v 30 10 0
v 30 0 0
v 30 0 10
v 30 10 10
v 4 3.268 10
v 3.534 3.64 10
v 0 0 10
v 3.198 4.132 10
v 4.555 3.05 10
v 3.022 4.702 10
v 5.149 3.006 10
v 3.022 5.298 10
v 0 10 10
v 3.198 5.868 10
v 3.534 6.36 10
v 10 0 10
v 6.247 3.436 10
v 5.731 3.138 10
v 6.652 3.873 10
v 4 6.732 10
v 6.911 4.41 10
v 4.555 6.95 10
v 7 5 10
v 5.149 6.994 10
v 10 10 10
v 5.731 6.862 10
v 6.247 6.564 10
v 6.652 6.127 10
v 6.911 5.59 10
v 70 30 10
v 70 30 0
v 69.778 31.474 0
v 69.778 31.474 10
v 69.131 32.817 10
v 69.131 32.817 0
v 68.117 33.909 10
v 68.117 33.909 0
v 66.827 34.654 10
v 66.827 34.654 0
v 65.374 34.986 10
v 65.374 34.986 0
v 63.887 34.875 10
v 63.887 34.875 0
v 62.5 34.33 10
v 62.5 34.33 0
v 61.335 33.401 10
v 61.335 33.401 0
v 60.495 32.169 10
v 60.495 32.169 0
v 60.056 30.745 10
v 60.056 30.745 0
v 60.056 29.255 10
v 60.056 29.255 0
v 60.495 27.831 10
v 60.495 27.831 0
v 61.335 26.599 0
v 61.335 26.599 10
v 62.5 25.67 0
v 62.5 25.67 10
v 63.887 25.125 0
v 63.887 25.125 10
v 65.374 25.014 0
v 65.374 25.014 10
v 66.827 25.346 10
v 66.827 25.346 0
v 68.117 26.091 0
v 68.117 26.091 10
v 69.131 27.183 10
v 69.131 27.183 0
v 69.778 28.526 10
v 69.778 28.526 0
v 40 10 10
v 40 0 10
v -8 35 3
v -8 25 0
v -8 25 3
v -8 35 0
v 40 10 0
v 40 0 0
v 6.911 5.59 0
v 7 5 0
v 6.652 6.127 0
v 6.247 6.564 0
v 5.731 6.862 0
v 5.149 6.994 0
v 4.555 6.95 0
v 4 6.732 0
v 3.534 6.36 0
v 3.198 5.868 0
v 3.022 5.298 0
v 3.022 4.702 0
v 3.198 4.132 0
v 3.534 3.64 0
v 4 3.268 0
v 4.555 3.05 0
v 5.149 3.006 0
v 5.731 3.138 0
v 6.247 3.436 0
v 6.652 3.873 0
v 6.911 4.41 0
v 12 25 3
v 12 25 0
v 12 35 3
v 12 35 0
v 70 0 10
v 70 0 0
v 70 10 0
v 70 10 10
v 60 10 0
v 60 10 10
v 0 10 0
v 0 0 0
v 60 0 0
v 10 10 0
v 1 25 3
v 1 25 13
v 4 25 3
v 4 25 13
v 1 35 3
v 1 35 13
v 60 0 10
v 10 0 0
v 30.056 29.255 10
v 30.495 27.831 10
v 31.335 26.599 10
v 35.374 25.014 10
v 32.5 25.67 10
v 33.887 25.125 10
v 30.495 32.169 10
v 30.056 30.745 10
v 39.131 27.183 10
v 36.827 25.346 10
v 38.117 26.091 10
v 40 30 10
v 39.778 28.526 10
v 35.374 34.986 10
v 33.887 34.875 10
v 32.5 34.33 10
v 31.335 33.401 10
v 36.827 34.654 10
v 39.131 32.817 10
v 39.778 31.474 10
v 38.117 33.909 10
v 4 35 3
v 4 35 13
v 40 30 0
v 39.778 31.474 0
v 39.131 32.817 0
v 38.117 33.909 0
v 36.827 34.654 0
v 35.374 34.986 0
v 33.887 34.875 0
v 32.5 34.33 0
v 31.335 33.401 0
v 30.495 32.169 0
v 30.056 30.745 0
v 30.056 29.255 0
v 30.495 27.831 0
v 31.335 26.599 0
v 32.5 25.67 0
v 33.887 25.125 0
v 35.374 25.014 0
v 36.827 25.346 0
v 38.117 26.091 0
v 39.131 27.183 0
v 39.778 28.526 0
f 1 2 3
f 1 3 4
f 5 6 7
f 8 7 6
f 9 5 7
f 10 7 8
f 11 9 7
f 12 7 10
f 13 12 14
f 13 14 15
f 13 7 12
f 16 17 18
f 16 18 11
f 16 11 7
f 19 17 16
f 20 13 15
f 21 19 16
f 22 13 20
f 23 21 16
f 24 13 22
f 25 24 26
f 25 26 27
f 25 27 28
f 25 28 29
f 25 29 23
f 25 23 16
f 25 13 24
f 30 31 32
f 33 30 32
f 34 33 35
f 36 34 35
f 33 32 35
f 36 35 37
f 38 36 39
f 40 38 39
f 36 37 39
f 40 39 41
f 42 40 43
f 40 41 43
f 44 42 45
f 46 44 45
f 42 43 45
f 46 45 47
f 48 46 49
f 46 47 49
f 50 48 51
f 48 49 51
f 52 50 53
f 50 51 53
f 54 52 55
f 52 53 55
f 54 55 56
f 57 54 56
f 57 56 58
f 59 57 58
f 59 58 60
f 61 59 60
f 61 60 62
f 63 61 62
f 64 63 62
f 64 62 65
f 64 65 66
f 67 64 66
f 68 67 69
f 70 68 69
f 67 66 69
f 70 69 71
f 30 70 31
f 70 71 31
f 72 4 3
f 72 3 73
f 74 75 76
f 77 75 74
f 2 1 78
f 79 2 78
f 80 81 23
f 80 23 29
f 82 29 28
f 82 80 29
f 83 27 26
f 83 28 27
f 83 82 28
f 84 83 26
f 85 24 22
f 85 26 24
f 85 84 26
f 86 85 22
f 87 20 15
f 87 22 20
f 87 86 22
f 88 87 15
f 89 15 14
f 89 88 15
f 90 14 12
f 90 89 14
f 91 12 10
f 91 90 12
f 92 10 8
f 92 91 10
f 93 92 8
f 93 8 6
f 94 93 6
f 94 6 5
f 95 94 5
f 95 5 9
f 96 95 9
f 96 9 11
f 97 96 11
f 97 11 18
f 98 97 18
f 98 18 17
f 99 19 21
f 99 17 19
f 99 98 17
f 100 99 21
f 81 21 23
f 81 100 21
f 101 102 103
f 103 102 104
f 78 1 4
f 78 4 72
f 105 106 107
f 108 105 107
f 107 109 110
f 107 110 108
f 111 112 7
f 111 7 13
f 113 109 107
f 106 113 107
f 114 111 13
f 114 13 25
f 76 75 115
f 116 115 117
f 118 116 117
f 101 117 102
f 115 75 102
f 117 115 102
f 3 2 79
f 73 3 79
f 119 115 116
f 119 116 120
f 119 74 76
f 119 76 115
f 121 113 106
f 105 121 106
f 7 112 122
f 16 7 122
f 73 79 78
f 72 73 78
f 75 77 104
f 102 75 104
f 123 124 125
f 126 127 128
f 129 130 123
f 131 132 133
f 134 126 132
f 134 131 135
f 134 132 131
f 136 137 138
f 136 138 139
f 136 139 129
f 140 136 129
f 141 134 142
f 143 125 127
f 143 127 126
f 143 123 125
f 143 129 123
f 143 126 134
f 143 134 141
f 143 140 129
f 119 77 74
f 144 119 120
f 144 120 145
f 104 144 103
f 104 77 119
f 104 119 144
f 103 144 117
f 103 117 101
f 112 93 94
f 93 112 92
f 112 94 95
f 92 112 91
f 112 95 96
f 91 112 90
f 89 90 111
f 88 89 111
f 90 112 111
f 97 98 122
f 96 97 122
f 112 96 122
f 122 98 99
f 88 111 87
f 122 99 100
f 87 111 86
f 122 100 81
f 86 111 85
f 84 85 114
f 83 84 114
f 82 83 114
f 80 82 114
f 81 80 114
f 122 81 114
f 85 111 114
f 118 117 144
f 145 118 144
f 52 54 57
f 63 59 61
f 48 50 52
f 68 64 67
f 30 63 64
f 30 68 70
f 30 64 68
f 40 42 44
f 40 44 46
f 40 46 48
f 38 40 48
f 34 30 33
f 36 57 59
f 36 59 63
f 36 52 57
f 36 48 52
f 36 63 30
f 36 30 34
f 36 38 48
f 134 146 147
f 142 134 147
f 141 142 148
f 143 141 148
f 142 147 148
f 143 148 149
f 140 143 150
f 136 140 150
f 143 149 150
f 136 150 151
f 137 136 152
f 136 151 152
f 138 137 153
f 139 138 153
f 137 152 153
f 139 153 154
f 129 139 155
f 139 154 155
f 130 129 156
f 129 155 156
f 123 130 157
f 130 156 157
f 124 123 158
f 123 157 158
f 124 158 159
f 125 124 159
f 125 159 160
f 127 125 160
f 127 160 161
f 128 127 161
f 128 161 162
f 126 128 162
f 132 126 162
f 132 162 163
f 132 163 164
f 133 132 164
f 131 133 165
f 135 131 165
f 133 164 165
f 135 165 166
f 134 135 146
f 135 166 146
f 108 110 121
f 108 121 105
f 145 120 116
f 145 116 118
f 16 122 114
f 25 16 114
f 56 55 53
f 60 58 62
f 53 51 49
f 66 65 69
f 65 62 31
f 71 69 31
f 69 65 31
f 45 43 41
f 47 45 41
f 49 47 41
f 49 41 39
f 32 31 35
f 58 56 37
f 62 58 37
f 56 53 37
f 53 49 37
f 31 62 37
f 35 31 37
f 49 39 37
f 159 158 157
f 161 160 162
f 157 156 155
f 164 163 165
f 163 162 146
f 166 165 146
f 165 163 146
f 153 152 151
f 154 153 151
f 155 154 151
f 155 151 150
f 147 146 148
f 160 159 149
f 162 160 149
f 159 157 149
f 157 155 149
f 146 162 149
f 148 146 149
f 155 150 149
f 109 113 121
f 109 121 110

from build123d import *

# Parameters (mm, degrees)
BOX_W             = 10
BOX_H             = 10
BOX_DEPTH         = 10
BOX002_W          = 10
BOX002_H          = 10
BOX002_DEPTH      = 10
CYLINDER_R        = 2
CYLINDER_DEPTH    = 20
BOX001_W          = 10
BOX001_H          = 10
BOX001_DEPTH      = 10
CYLINDER001_R     = 5
CYLINDER001_DEPTH = 10
CYLINDER002_R     = 5
CYLINDER002_DEPTH = 10
BOX004_W          = 3
BOX004_H          = 10
BOX004_DEPTH      = 10
BOX003_W          = 20
BOX003_H          = 10
BOX003_DEPTH      = 3


with BuildPart() as box:
    # Box → Box (new body)
    with BuildSketch(Plane(origin=(60, 0, 0), x_dir=(1, 0, 0), z_dir=(0, 0, 1))):
        with Locations((5, 5)):
            Rectangle(BOX_W, BOX_H)
    extrude(amount=BOX_DEPTH)


with BuildPart() as box002:
    # Box002 → Box002 (new body)
    with BuildSketch(Plane(origin=(30, 0, 0), x_dir=(1, 0, 0), z_dir=(0, 0, 1))):
        with Locations((5, 5)):
            Rectangle(BOX002_W, BOX002_H)
    extrude(amount=BOX002_DEPTH)


with BuildPart() as cylinder:
    # Cylinder → Cylinder (new body)
    with BuildSketch(Plane(origin=(5, 5, -2), x_dir=(1, 0, 0), z_dir=(0, 0, 1))):
        Circle(CYLINDER_R)
    extrude(amount=CYLINDER_DEPTH)


with BuildPart() as cut:
    # Box001 → Box001 (new body)
    with BuildSketch(Plane.XY):
        with Locations((5, 5)):
            Rectangle(BOX001_W, BOX001_H)
    extrude(amount=BOX001_DEPTH)

    # Cut: cut Cylinder
    add(cylinder.part, mode=Mode.SUBTRACT)


with BuildPart() as cylinder001:
    # Cylinder001 → Cylinder001 (new body)
    with BuildSketch(Plane(origin=(65, 30, 0), x_dir=(1, 0, 0), z_dir=(0, 0, 1))):
        Circle(CYLINDER001_R)
    extrude(amount=CYLINDER001_DEPTH)


with BuildPart() as cylinder002:
    # Cylinder002 → Cylinder002 (new body)
    with BuildSketch(Plane(origin=(35, 30, 0), x_dir=(1, 0, 0), z_dir=(0, 0, 1))):
        Circle(CYLINDER002_R)
    extrude(amount=CYLINDER002_DEPTH)


with BuildPart() as box004:
    # Box004 → Box004 (new body)
    with BuildSketch(Plane(origin=(1, 25, 3), x_dir=(1, 0, 0), z_dir=(0, 0, 1))):
        with Locations((1.5, 5)):
            Rectangle(BOX004_W, BOX004_H)
    extrude(amount=BOX004_DEPTH)


with BuildPart() as fusion:
    # Box003 → Box003 (new body)
    with BuildSketch(Plane(origin=(-8, 25, 0), x_dir=(1, 0, 0), z_dir=(0, 0, 1))):
        with Locations((10, 5)):
            Rectangle(BOX003_W, BOX003_H)
    extrude(amount=BOX003_DEPTH)

    # Fusion: union Box004
    add(box004.part)


solid = Compound([box.part, box002.part, cut.part, cylinder001.part, cylinder002.part, fusion.part])
